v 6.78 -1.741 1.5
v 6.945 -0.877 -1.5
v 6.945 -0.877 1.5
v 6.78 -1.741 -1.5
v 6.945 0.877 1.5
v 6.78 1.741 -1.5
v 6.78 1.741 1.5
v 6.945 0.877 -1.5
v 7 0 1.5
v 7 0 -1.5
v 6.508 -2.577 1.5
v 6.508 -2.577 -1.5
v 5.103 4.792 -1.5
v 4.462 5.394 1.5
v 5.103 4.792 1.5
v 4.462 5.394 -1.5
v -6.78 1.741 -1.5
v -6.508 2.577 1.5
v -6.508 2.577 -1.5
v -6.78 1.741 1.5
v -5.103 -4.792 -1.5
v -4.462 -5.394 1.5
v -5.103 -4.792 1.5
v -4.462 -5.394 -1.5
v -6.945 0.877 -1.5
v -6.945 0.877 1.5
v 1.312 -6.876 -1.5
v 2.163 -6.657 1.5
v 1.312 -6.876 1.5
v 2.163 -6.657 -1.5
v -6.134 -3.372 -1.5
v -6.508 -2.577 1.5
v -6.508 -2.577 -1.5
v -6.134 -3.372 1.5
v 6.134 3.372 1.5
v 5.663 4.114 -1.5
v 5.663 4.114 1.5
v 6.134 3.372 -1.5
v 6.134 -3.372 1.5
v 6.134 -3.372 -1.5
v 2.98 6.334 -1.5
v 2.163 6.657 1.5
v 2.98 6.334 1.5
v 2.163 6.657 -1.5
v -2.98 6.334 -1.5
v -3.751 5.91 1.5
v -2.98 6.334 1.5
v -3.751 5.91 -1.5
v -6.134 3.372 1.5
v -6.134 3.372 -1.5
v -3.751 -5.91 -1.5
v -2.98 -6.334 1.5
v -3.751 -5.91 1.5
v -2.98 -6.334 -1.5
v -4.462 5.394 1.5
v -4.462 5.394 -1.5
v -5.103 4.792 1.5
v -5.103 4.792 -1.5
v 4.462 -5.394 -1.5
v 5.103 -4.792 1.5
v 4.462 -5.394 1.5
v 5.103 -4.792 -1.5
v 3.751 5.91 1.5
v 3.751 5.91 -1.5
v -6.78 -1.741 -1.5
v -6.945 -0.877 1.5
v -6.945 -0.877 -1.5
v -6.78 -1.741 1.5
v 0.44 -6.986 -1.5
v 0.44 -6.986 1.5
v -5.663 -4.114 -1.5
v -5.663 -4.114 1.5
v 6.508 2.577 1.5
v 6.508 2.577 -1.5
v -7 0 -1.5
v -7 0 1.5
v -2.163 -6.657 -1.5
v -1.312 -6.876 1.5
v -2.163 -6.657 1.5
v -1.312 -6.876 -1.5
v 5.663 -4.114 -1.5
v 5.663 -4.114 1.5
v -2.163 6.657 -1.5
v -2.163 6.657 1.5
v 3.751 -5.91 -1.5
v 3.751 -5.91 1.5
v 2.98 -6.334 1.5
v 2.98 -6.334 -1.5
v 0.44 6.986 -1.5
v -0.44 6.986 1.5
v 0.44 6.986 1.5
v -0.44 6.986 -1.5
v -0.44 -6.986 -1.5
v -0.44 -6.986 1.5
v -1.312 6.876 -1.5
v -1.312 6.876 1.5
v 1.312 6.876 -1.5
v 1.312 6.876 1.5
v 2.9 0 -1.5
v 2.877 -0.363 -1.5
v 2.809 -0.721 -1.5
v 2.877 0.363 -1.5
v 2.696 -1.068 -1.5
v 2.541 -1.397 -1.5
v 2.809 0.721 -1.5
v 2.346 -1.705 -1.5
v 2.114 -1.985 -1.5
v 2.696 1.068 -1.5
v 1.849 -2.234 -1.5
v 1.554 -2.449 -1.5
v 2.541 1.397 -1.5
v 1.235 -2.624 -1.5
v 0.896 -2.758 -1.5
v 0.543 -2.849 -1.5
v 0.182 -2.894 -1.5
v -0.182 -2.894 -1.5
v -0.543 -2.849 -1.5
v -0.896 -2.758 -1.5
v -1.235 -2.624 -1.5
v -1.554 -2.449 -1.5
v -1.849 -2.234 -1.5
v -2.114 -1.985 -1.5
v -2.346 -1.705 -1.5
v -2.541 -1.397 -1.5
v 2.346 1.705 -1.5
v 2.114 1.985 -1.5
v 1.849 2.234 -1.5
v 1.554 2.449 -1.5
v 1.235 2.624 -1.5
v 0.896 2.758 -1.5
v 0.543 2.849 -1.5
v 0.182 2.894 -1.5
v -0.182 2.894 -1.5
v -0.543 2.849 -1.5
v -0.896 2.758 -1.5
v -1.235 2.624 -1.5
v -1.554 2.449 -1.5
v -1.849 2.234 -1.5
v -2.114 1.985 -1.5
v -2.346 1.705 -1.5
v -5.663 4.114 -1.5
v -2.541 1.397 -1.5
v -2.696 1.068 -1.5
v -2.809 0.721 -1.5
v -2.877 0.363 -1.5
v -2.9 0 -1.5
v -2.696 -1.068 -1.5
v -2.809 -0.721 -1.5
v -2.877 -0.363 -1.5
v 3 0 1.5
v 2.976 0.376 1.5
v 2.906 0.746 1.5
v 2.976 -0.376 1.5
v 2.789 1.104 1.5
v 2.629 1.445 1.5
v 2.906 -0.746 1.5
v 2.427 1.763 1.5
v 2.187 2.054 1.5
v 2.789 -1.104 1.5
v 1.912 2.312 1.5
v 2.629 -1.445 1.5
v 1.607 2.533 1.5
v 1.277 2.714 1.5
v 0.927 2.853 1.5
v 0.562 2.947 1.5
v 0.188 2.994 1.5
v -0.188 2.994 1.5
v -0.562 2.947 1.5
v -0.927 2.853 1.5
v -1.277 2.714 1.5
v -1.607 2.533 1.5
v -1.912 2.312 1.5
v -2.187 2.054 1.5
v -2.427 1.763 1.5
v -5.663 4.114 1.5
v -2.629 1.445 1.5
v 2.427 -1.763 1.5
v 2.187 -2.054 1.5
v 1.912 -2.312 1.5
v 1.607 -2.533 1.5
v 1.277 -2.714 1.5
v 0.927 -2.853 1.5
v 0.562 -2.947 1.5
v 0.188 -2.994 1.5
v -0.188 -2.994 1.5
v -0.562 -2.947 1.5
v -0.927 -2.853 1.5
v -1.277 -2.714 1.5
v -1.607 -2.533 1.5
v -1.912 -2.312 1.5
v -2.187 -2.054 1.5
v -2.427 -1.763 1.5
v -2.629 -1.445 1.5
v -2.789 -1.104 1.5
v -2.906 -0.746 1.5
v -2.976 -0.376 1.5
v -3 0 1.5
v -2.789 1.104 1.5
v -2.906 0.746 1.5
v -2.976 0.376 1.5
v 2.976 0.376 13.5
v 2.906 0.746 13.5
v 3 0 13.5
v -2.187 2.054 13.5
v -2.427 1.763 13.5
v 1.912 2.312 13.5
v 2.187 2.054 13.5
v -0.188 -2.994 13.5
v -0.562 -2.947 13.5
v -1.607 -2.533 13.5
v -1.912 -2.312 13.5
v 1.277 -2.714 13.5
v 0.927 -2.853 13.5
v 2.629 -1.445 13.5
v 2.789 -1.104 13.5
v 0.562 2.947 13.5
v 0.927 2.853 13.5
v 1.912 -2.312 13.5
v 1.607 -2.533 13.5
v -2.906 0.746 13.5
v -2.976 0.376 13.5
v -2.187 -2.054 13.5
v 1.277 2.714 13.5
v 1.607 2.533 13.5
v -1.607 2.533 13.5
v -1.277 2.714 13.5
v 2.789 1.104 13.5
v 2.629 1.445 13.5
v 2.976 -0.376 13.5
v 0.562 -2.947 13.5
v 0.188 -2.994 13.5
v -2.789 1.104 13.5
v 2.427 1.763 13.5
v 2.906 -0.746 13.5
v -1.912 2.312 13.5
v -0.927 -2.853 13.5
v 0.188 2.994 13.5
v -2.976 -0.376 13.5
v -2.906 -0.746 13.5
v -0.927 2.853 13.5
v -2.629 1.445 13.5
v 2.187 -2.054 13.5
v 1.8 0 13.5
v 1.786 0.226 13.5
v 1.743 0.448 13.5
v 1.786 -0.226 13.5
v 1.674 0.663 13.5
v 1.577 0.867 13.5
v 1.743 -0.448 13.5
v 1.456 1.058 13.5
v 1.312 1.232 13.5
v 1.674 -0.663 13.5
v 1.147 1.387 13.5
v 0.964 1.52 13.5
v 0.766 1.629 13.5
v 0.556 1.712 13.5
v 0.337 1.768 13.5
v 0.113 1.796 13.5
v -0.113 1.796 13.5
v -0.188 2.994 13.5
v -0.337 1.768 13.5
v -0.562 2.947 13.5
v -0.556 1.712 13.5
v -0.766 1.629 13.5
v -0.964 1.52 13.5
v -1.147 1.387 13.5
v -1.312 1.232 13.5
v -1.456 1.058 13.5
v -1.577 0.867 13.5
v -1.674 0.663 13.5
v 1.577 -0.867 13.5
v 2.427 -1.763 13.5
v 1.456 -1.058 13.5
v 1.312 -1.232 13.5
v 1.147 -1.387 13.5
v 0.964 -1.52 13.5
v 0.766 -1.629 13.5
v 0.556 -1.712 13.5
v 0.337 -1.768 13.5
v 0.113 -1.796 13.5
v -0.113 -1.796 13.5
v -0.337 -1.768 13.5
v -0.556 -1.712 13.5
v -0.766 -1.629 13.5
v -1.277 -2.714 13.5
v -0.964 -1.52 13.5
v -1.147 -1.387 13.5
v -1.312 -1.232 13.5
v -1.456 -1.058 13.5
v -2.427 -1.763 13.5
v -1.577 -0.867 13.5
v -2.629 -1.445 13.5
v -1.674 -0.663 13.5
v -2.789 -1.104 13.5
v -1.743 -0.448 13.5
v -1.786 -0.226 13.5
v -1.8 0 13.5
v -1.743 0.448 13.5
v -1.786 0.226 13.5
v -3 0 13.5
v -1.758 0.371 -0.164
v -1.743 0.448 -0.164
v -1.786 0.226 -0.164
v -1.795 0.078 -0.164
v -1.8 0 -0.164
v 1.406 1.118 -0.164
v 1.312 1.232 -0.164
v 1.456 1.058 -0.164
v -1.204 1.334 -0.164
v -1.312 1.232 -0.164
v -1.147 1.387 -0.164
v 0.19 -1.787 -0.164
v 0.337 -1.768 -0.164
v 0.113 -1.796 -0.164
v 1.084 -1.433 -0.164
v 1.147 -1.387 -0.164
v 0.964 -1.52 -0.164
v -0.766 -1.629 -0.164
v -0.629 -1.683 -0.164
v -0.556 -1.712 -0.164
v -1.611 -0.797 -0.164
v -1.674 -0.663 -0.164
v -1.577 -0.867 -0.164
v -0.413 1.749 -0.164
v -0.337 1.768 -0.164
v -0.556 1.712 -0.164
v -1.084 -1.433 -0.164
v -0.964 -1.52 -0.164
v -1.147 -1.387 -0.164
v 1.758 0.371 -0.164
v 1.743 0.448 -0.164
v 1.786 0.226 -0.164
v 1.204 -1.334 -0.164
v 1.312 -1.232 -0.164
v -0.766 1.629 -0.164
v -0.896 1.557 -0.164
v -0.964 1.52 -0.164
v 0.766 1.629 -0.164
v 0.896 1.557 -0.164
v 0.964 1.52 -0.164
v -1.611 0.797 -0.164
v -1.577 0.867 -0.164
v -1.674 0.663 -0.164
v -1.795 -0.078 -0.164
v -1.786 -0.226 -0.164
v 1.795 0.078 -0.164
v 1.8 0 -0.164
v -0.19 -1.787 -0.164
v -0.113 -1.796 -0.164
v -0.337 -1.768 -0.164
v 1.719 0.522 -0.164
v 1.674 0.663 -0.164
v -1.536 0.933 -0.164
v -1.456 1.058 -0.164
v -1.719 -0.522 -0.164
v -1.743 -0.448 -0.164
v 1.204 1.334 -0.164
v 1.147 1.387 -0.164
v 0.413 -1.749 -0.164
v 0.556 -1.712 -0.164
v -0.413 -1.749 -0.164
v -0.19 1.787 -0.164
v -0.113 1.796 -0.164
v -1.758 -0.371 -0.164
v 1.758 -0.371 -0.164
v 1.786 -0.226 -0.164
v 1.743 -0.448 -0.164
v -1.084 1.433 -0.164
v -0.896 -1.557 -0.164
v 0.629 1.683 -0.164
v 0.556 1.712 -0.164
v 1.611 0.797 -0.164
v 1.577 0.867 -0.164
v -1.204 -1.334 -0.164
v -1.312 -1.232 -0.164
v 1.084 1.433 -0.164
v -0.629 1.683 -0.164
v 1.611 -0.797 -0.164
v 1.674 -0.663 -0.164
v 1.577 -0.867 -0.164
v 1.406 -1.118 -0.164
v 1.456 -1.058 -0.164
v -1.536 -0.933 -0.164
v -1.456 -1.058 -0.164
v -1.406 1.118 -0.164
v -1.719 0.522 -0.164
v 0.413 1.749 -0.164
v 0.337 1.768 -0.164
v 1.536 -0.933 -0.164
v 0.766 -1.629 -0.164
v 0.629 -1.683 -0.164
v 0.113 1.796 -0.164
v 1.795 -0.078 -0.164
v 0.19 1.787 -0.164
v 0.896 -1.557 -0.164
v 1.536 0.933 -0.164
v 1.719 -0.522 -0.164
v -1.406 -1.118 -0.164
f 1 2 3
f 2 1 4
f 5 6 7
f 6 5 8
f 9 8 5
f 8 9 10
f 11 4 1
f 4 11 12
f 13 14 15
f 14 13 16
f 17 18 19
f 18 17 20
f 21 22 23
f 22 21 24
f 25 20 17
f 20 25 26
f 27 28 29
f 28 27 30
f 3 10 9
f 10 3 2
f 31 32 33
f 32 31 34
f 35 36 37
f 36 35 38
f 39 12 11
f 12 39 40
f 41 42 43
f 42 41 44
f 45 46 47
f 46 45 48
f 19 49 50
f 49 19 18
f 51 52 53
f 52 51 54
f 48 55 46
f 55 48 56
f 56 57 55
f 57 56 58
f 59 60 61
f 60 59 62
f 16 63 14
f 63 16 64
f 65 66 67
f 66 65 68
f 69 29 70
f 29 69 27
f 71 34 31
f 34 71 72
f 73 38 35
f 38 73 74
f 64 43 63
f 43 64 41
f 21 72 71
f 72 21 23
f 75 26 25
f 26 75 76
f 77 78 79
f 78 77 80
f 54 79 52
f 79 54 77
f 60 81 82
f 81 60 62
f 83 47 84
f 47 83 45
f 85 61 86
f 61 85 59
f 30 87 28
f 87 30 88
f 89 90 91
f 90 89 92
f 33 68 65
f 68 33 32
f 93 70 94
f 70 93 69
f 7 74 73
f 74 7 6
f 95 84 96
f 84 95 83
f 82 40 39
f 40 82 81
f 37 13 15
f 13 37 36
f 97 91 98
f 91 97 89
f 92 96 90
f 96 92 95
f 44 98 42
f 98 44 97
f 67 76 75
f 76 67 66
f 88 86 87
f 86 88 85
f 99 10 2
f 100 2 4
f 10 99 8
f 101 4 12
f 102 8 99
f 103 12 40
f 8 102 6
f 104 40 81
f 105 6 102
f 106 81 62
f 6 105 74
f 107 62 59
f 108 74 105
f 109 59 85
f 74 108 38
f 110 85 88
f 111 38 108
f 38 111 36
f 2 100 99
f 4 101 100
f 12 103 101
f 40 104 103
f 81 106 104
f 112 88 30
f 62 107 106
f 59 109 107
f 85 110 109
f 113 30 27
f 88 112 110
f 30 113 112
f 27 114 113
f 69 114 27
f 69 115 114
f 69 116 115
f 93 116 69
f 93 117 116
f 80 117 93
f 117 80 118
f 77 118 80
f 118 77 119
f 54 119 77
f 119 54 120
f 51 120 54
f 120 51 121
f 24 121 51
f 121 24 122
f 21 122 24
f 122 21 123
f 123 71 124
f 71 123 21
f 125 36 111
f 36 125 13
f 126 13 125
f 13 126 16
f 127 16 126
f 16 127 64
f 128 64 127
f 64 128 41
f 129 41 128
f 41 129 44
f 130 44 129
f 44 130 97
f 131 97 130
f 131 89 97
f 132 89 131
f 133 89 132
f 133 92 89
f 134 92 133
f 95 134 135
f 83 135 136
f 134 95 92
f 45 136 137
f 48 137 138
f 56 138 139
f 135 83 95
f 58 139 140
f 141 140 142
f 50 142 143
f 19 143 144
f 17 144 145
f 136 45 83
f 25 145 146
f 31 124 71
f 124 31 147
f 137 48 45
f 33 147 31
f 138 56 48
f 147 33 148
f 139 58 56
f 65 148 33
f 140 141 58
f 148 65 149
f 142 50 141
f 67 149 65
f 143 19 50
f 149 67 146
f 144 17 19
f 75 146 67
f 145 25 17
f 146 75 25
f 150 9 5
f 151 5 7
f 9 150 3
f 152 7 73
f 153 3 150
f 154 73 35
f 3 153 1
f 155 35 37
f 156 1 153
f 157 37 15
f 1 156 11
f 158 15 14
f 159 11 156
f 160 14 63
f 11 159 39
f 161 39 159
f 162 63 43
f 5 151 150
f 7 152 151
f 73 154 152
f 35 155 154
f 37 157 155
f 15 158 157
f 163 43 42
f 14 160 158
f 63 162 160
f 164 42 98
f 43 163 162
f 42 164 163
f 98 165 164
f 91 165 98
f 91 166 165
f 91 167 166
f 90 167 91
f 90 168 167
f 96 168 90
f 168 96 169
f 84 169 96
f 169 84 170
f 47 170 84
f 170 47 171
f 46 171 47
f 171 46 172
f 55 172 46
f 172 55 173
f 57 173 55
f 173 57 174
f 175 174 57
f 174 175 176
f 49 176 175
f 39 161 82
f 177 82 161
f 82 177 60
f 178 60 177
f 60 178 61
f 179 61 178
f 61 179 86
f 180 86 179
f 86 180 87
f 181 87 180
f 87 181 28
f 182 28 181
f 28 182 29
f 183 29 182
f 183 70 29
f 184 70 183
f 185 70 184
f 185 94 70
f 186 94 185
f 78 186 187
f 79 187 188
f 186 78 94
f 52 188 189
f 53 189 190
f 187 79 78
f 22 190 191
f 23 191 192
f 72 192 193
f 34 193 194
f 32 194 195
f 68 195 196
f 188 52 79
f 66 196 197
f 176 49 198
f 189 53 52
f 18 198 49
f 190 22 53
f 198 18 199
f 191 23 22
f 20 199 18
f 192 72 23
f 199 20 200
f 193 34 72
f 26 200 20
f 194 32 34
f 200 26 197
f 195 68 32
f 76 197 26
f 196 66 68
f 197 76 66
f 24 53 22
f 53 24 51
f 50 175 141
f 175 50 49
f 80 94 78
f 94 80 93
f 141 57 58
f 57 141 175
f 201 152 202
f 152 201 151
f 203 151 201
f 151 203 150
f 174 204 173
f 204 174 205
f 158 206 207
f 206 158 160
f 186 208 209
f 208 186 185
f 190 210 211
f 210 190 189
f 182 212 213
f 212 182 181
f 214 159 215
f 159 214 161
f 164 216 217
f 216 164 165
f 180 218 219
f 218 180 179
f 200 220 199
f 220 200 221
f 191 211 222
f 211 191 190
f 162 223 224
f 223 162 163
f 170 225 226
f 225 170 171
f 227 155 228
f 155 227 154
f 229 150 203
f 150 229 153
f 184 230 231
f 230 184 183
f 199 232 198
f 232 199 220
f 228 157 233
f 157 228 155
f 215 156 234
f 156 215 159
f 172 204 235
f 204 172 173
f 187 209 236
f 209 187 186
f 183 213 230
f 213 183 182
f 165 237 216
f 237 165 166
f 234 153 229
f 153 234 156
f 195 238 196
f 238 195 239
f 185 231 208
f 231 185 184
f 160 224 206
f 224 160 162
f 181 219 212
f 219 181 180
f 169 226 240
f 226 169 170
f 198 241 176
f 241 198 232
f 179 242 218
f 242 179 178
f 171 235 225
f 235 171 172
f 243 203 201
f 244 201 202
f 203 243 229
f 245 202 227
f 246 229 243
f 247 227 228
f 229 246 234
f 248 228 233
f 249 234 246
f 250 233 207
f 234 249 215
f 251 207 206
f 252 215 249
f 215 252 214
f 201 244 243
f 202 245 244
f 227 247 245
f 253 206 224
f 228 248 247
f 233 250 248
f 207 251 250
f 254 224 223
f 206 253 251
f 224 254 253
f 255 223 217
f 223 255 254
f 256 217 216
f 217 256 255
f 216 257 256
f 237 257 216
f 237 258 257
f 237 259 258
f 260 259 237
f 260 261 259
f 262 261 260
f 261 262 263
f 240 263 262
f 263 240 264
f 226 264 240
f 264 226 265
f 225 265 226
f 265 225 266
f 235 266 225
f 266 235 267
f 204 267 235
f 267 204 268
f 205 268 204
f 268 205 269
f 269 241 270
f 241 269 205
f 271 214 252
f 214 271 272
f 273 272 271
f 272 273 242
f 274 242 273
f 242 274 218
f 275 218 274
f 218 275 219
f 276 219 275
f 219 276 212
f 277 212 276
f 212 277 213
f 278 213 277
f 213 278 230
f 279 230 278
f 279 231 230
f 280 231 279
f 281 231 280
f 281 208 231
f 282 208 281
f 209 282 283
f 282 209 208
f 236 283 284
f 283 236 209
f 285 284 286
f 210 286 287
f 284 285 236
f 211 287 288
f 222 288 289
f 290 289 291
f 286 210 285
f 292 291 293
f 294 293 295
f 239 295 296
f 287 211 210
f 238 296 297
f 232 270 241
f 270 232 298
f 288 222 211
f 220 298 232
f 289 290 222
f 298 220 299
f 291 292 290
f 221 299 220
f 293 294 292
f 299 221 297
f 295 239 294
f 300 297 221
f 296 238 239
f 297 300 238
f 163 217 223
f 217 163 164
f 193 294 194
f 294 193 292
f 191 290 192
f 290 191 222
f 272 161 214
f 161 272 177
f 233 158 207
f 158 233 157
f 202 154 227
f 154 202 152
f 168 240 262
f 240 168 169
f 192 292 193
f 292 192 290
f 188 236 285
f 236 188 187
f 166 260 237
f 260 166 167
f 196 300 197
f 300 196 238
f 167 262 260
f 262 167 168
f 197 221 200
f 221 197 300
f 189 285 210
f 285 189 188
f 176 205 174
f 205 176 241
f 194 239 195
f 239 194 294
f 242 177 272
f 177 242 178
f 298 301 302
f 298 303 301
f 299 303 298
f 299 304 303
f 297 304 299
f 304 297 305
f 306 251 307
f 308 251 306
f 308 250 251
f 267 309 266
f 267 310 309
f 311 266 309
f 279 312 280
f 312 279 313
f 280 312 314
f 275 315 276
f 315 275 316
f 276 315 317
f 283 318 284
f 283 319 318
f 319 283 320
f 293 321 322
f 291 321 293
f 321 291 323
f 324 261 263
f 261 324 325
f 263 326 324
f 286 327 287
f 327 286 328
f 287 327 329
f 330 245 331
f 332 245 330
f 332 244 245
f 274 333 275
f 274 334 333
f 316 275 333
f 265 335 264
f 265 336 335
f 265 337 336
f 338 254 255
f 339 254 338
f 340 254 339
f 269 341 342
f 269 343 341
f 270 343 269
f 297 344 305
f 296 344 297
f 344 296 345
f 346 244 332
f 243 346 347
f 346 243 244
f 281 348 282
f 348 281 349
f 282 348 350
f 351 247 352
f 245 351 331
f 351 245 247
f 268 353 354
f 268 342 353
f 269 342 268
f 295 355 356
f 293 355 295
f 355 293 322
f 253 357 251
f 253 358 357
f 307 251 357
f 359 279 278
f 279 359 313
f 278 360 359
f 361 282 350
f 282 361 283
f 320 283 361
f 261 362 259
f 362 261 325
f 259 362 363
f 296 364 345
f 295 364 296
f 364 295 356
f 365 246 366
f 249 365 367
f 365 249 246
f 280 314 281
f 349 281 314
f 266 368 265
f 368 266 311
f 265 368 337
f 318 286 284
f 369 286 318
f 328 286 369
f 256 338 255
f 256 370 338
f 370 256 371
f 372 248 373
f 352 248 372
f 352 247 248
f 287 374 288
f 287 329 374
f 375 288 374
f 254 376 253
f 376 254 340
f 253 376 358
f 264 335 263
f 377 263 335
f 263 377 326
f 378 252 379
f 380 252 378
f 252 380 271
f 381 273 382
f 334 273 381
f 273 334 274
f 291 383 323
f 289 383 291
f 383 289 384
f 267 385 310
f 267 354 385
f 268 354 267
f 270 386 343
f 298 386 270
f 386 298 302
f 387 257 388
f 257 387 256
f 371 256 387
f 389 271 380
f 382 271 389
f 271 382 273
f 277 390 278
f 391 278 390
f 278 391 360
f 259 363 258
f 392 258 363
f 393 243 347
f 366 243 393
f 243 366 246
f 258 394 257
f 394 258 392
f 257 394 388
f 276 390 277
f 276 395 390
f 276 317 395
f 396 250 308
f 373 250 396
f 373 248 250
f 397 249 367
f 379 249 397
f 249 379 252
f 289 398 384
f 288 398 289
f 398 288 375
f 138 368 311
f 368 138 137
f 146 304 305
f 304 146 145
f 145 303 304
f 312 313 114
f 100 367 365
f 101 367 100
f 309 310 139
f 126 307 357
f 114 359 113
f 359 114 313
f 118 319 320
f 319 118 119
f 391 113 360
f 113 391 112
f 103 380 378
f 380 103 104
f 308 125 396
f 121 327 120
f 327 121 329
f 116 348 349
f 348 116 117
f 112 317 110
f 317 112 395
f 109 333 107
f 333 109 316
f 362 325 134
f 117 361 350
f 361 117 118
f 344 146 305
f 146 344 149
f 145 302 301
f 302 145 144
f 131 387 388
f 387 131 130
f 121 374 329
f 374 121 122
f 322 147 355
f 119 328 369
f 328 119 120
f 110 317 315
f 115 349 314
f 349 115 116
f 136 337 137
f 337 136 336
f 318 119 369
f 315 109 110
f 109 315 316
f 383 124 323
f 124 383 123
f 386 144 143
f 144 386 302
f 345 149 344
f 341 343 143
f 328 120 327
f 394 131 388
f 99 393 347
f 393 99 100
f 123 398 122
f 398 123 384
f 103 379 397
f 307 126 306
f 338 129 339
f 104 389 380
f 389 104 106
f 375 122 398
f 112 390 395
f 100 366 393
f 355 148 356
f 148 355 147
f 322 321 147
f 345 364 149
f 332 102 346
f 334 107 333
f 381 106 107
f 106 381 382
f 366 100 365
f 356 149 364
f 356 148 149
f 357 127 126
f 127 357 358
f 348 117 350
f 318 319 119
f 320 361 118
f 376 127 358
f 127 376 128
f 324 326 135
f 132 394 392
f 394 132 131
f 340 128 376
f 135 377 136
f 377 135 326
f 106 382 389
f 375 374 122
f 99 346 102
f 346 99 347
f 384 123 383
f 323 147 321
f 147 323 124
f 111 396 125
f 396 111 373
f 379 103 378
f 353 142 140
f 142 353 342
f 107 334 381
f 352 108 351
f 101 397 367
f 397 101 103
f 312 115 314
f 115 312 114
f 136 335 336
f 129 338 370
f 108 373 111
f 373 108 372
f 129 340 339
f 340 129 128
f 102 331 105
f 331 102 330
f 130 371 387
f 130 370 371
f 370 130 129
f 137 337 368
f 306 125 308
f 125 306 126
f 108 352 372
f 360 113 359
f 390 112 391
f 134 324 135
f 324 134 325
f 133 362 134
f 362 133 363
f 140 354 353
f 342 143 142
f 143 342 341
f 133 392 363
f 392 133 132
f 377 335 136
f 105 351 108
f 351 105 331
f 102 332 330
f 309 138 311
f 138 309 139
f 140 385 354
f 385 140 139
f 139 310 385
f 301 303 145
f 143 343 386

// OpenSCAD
$fn = 50;


difference() {
	union() {
		translate(v = [0, 0, -1.5000000000]) {
			cylinder(h = 3, r = 7.0000000000);
		}
		translate(v = [0, 0, -1.5000000000]) {
			cylinder(h = 15, r = 3.0000000000);
		}
	}
	union() {
		translate(v = [0, 0, -1.5000000000]) {
			rotate(a = [0, 180, 0]) {
				difference() {
					union() {
						translate(v = [0, 0, -15.0000000000]) {
							cylinder(h = 15, r = 1.5000000000);
						}
						translate(v = [0, 0, -15.0000000000]) {
							cylinder(h = 15, r = 1.8000000000);
						}
						translate(v = [0, 0, -1.7000000000]) {
							cylinder(h = 1.7000000000, r1 = 1.5000000000, r2 = 2.9000000000);
						}
						translate(v = [0, 0, -15.0000000000]) {
							cylinder(h = 15, r = 1.5000000000);
						}
					}
					union();
				}
			}
		}
		translate(v = [0, 0, -100.0000000000]) {
			cylinder(h = 200, r = 1.5000000000);
		}
	}
}
